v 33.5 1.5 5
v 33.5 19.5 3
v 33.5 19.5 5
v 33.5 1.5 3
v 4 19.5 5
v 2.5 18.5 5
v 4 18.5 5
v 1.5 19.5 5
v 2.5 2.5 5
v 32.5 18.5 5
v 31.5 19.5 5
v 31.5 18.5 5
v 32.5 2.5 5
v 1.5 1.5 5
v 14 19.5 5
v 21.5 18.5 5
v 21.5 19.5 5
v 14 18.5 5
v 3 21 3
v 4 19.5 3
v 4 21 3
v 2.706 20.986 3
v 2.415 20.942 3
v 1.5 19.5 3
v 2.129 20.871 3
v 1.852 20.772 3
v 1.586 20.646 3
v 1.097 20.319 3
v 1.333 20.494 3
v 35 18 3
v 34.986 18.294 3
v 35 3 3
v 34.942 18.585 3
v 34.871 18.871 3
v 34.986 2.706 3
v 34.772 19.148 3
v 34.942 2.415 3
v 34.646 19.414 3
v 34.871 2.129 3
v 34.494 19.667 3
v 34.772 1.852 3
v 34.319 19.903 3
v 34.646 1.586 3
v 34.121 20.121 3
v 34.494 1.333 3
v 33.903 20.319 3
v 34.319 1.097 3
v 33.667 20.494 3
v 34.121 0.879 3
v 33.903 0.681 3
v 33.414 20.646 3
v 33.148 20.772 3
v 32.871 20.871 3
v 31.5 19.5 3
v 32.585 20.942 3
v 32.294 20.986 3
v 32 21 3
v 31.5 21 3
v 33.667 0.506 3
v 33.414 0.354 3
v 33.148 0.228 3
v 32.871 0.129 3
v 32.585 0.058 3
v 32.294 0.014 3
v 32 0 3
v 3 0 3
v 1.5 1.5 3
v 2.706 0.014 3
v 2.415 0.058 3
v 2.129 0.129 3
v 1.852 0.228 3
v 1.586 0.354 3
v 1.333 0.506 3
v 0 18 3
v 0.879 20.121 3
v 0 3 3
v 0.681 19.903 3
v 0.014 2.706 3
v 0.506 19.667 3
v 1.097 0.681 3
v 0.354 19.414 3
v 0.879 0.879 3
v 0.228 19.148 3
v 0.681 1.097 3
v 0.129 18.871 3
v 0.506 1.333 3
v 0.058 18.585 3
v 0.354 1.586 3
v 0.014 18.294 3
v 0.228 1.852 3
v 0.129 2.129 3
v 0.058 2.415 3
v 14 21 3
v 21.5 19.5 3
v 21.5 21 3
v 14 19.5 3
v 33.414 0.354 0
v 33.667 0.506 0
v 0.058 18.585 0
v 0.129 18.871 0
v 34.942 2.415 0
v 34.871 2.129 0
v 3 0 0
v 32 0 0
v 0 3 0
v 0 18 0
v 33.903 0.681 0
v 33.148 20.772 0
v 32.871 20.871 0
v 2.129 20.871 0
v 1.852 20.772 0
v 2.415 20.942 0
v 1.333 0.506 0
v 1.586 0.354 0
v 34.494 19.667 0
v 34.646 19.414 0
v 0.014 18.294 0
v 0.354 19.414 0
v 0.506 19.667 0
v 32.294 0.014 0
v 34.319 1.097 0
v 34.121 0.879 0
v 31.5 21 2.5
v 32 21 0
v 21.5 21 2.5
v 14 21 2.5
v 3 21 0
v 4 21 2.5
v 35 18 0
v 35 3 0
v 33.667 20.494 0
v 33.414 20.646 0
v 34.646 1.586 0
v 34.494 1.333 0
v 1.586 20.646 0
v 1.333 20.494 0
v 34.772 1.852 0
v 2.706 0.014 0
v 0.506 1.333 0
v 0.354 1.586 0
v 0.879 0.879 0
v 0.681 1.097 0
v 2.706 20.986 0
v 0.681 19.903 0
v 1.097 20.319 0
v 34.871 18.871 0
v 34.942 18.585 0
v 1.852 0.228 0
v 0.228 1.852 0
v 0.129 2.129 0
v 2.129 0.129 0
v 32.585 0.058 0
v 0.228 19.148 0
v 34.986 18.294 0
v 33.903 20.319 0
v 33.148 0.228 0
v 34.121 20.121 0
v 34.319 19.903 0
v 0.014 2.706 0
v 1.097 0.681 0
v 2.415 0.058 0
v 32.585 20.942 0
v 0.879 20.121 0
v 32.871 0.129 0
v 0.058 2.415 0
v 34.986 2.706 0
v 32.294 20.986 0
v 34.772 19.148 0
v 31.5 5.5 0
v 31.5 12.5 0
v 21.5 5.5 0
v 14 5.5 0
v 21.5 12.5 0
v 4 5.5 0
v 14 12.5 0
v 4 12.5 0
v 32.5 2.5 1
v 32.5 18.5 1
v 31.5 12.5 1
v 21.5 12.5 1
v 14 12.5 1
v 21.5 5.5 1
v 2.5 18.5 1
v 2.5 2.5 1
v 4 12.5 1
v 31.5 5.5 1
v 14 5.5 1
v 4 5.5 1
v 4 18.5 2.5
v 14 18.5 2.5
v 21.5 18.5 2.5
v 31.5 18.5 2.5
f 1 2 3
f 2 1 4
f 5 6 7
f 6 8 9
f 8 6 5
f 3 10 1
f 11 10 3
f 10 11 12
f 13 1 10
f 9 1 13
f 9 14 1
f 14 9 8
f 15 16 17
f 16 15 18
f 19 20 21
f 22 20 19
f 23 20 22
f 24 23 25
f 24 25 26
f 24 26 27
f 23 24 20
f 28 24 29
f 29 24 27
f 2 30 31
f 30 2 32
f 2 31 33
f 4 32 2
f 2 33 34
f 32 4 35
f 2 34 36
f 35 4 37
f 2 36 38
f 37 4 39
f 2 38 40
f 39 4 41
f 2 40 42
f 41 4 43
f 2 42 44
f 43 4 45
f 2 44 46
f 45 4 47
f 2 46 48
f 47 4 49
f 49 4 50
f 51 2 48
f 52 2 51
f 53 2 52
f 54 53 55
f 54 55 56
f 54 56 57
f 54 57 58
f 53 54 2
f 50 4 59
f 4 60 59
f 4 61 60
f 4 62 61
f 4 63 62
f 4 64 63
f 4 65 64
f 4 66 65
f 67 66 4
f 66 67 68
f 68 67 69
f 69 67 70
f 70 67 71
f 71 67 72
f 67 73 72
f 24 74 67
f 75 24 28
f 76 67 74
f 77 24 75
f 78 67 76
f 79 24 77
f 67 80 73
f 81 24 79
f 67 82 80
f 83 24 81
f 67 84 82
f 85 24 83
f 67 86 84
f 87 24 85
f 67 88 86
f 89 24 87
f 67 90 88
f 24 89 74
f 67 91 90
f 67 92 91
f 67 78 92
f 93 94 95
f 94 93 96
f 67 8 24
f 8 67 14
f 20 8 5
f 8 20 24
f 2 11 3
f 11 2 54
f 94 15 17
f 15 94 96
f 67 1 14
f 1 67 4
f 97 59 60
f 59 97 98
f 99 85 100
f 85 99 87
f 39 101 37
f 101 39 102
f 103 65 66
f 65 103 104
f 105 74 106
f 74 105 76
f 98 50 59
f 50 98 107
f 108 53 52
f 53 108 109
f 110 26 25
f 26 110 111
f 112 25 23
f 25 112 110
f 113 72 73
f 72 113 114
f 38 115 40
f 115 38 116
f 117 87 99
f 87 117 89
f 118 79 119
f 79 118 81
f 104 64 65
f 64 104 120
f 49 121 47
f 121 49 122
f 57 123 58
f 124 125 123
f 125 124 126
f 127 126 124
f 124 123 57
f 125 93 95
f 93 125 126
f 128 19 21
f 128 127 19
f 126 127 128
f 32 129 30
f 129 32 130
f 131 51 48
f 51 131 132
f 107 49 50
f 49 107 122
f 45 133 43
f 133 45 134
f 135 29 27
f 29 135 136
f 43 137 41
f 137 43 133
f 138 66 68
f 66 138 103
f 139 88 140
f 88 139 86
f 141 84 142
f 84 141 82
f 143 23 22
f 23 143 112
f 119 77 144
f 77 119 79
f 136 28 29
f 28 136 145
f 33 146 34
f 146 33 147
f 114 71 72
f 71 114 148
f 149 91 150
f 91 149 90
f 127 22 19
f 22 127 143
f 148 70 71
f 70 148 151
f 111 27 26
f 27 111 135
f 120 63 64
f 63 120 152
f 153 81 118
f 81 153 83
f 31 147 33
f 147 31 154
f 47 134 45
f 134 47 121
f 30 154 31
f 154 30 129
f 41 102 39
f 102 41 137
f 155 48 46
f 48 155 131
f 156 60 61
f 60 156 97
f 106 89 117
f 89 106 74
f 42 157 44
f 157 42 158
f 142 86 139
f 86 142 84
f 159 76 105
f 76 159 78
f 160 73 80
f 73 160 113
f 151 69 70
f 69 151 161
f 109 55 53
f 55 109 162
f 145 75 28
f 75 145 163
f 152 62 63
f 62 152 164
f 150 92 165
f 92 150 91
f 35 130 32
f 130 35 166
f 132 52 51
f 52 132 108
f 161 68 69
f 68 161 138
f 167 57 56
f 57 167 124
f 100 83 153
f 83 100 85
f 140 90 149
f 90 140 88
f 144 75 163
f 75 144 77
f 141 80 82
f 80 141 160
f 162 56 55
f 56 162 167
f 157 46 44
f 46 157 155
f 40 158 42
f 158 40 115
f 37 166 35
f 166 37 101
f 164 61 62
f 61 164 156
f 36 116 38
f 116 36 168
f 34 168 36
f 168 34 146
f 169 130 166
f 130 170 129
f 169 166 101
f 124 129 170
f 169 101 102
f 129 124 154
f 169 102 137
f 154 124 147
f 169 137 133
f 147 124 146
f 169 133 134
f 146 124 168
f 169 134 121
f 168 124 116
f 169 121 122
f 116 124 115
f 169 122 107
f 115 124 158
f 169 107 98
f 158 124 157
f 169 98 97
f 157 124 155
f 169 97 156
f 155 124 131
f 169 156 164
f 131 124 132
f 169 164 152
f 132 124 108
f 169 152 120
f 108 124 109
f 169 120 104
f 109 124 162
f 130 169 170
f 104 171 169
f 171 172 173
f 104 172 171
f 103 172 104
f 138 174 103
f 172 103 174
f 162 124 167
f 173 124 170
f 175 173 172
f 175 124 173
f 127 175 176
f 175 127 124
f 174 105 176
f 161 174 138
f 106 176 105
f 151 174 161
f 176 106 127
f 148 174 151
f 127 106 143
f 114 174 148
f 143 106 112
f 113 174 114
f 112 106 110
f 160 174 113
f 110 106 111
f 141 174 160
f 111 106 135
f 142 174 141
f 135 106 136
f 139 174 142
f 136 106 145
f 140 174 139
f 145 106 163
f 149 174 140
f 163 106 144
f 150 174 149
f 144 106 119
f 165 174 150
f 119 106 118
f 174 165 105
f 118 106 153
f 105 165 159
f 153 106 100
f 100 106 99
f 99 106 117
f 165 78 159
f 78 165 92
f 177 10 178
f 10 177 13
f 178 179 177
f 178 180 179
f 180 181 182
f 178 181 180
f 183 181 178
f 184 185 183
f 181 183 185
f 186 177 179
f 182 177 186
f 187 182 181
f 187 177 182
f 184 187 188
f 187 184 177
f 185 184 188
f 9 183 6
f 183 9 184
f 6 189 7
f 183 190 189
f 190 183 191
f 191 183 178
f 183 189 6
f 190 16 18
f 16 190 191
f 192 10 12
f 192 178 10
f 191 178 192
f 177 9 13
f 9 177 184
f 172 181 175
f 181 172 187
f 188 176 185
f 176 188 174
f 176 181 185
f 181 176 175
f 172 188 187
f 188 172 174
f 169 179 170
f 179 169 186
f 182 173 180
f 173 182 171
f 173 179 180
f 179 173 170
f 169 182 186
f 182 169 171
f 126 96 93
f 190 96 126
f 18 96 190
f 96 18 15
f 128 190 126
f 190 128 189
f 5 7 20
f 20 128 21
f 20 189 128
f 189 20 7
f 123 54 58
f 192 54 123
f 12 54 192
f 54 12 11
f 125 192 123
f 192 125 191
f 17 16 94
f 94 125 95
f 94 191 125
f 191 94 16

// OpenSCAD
$fn = 64;
TOL = .01;

DEPTH = 1;
5V_WIDTH = 29;
5V_HEIGHT = 17;
5V_WIDTH_CUTOUT = 5;
5V_HEIGHT_CUTOUT = 3;

230V_WIDTH1 = 32;
230V_HEIGHT1 = 18;
230V_DEPTH1 = 2;
230V_WIDTH2 = 35;
230V_HEIGHT2 = 21;
230V_DEPTH2 = 3;
230V_WIDTH_CUTOUT = 10;
230V_HEIGHT_CUTOUT = 7;

OUTER_COVER_RADIUS = 3;
OUTER_COVER_CUTOUT = .5;

module 5v_cover() {
    difference() {
        cube([5V_WIDTH, 5V_HEIGHT, DEPTH]);
        translate([(5V_WIDTH - 5V_WIDTH_CUTOUT)/2, (5V_HEIGHT - 5V_HEIGHT_CUTOUT)/2, -TOL])
            cube([5V_WIDTH_CUTOUT, 5V_HEIGHT_CUTOUT, DEPTH+2*TOL]);
    }
}

module outer_cover() {
    // cube([230V_WIDTH2, 230V_HEIGHT2, 230V_DEPTH2]);
    translate([OUTER_COVER_RADIUS, OUTER_COVER_RADIUS, 0])
        hull() {
            for (x = [0, 230V_WIDTH2 - 2*OUTER_COVER_RADIUS])
                for (y = [0, 230V_HEIGHT2 - 2*OUTER_COVER_RADIUS])
                    translate([x, y, 0])
                        cylinder(r = OUTER_COVER_RADIUS, h = 230V_DEPTH2);
        }
}

module 230v_cover() {
    difference() {
        union() {
            translate([(230V_WIDTH2 - 230V_WIDTH1)/2, (230V_HEIGHT2 - 230V_HEIGHT1)/2, 230V_DEPTH2])
                cube([230V_WIDTH1, 230V_HEIGHT1, 230V_DEPTH1]);
            outer_cover();
        }
        translate([(230V_WIDTH2 - 230V_WIDTH1)/2 + DEPTH, (230V_HEIGHT2 - 230V_HEIGHT1)/2 + DEPTH, DEPTH])
            cube([230V_WIDTH1 - 2*DEPTH, 230V_HEIGHT1 - 2*DEPTH, 230V_DEPTH1 + 230V_DEPTH2 + TOL]);
        translate([4, 5.5, -TOL])
            cube([230V_WIDTH_CUTOUT, 230V_HEIGHT_CUTOUT, DEPTH + 2*TOL]);
        translate([21.5, 5.5, -TOL])
            cube([230V_WIDTH_CUTOUT, 230V_HEIGHT_CUTOUT, DEPTH + 2*TOL]);
        translate([4, 230V_HEIGHT1 - TOL, 230V_DEPTH2 - OUTER_COVER_CUTOUT])
            cube([230V_WIDTH_CUTOUT, 230V_HEIGHT_CUTOUT, 230V_DEPTH1 + OUTER_COVER_CUTOUT + TOL]);
        translate([21.5, 230V_HEIGHT1 - TOL, 230V_DEPTH2 - OUTER_COVER_CUTOUT])
            cube([230V_WIDTH_CUTOUT, 230V_HEIGHT_CUTOUT, 230V_DEPTH1 + OUTER_COVER_CUTOUT + TOL]);

    }
}

// translate([40, 0, 0]) 5v_cover();
230v_cover();
